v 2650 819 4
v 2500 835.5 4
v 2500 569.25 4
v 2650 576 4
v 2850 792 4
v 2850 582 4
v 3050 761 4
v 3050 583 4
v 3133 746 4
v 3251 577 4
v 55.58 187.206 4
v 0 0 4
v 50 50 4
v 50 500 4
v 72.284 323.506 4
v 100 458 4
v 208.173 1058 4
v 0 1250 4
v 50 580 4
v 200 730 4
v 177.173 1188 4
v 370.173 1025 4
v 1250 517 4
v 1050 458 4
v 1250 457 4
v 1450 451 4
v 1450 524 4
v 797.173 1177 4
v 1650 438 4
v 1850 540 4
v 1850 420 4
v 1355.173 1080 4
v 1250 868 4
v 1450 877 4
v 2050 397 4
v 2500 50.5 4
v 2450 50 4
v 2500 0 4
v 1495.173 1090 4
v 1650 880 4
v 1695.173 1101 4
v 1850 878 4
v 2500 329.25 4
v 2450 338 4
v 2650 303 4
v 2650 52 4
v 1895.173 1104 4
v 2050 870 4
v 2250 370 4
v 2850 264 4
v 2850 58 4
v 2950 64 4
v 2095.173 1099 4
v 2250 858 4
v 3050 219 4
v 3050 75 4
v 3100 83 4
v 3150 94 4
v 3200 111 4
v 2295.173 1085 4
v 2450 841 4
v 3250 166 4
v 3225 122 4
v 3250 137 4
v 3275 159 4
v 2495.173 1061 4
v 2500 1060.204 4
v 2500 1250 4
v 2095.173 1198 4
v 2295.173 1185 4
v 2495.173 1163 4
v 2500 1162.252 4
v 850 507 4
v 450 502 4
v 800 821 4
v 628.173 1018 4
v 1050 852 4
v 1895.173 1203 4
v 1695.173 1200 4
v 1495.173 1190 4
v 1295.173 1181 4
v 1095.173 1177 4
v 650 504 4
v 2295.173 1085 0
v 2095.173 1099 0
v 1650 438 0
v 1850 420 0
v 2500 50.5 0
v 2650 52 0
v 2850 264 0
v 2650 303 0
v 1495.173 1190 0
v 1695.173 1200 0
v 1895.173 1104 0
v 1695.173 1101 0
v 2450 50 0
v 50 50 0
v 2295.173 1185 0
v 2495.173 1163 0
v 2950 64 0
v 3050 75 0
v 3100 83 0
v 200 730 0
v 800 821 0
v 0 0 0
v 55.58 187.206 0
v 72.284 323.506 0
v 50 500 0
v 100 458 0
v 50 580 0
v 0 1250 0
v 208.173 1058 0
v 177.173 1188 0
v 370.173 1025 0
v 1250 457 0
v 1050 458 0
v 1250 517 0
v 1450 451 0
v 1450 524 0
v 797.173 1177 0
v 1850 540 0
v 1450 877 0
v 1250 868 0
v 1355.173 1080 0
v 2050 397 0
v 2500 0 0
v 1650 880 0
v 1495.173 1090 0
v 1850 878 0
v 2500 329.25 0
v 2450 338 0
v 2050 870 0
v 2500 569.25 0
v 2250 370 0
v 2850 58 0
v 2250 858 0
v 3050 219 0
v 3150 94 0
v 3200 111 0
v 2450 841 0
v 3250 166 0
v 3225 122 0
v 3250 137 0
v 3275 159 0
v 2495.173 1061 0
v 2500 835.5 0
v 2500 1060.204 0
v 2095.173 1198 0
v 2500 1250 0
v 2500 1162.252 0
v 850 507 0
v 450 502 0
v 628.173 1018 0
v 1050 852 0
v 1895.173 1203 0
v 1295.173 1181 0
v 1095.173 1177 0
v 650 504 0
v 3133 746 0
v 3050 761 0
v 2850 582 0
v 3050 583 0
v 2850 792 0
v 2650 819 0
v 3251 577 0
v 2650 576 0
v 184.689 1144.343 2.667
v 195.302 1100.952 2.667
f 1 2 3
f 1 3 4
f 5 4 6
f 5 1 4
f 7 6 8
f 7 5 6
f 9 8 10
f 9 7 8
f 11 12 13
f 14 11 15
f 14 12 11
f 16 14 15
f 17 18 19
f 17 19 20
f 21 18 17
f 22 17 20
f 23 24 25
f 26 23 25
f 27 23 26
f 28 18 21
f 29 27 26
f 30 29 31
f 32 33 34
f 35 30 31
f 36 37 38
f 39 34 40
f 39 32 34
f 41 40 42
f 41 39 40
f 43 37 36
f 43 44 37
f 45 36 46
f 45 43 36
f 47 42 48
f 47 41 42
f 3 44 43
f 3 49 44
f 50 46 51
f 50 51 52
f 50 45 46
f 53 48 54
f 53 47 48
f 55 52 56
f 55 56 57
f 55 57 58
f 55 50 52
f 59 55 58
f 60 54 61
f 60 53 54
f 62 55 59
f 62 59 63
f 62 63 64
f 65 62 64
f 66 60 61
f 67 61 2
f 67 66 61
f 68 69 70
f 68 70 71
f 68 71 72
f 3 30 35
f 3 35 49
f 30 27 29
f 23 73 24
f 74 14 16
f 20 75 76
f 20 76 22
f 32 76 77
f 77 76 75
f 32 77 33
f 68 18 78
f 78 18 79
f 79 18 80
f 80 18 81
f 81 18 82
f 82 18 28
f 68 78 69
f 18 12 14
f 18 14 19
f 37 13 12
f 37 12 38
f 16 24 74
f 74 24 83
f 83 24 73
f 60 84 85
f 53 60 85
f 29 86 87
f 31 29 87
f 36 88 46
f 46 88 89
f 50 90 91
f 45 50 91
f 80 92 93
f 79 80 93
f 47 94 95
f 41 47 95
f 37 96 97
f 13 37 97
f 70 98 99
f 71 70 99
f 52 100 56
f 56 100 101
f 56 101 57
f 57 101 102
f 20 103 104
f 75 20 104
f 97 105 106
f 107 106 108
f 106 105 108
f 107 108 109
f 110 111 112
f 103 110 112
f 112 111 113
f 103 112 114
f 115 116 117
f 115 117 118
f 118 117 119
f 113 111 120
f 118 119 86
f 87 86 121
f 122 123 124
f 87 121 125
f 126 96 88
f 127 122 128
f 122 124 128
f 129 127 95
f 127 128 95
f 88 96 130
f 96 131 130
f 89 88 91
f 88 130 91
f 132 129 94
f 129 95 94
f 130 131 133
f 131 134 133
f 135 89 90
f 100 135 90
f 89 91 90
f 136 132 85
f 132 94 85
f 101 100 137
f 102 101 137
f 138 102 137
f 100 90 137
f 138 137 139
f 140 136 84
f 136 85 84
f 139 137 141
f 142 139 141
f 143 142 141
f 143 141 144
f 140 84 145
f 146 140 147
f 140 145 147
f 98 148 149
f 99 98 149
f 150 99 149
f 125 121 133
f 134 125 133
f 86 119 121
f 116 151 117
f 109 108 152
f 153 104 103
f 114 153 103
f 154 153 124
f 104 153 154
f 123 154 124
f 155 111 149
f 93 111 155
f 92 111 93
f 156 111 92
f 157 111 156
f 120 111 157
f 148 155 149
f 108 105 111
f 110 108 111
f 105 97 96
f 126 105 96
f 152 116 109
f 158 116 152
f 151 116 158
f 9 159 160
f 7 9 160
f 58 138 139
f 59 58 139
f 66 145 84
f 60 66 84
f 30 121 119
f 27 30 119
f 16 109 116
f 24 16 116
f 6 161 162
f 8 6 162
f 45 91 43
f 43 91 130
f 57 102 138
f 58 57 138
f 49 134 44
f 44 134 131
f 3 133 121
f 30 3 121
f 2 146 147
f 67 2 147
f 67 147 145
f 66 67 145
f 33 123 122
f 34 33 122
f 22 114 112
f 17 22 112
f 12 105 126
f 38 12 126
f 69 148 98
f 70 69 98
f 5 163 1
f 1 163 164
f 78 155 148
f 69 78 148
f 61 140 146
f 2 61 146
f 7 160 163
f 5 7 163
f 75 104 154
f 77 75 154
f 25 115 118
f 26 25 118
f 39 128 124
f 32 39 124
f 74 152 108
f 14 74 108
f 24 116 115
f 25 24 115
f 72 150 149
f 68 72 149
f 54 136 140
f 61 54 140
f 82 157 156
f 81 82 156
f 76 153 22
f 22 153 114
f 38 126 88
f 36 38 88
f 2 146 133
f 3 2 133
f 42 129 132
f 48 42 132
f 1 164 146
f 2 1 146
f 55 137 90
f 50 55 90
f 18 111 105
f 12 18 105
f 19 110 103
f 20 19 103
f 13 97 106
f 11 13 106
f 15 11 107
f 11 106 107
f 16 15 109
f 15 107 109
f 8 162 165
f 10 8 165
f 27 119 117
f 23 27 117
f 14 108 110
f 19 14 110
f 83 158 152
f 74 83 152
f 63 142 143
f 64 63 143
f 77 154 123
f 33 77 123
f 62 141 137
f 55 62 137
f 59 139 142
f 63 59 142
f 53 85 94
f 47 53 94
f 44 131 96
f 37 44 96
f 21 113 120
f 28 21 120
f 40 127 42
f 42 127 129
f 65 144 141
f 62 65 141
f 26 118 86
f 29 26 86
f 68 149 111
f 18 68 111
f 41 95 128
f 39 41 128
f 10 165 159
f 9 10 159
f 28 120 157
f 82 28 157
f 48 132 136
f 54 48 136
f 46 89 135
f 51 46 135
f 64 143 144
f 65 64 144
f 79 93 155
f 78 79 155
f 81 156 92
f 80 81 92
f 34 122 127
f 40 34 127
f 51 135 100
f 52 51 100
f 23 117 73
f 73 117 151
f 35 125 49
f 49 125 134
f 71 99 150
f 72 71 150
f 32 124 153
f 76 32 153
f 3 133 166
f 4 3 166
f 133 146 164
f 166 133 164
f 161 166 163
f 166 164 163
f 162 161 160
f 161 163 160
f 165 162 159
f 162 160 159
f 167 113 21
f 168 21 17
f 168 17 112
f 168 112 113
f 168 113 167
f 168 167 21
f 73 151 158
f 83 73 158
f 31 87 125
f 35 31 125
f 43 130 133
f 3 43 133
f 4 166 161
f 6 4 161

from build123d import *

# Parameters (mm, degrees)
F1_DEPTH = 4


with BuildPart() as f1:
    # F0 (on Top) → F1 (new body)
    with BuildSketch(Plane.XY):
        Polygon((3250, 166), (3050, 219), (3050, 75), (3100, 83), (3150, 94), (3200, 111), (3225, 122), (3250, 137), (3275, 159), align=None)
        Polygon((2500, 329.25), (2500, 50.5), (2650, 52), (2650, 303), align=None)
        Polygon((2650, 303), (2650, 52), (2850, 58), (2850, 264), align=None)
        Polygon((2850, 264), (2850, 58), (2950, 64), (3050, 75), (3050, 219), align=None)
        Polygon((2450, 50), (2500, 50.5), (2500, 329.25), (2450, 338), align=None)
        with BuildLine():
            Line((0, 0), (2500, 0))
            Line((2500, 0), (2500, 50.5))
            Line((2500, 50.5), (2450, 50))
            Line((2450, 50), (2250, 50))
            Line((2250, 50), (2050, 50))
            Line((2050, 50), (1850, 50))
            Line((1850, 50), (1650, 50))
            Line((1650, 50), (1450, 50))
            Line((1450, 50), (1250, 50))
            Line((1250, 50), (1050, 50))
            Line((1050, 50), (50, 50))
            ThreePointArc((50, 50), (62.5465829239, 255.5261540534), (100, 458))
            Line((100, 458), (1050, 458))
            Line((1050, 458), (1250, 457))
            Line((1250, 457), (1450, 451))
            Line((1450, 451), (1650, 438))
            Line((1650, 438), (1850, 420))
            Line((1850, 420), (2050, 397))
            Line((2050, 397), (2250, 370))
            Line((2250, 370), (2450, 338))
            Line((2450, 338), (2500, 329.25))
            Line((2500, 329.25), (2500, 569.25))
            Line((2500, 569.25), (2450, 567))
            Line((2450, 567), (2250, 558))
            Line((2250, 558), (2050, 549))
            Line((2050, 549), (1850, 540))
            Line((1850, 540), (1650, 532))
            Line((1650, 532), (1450, 524))
            Line((1450, 524), (1250, 517))
            Line((1250, 517), (1050, 512))
            Line((1050, 512), (850, 507))
            Line((850, 507), (650, 504))
            Line((650, 504), (450, 502))
            Line((450, 502), (50, 500))
            Line((50, 500), (50, 580))
            Line((50, 580), (200, 730))
            Line((200, 730), (305.4945054945, 746))
            Line((305.4945054945, 746), (800, 821))
            Line((800, 821), (1050, 852))
            Line((1050, 852), (1250, 868))
            Line((1250, 868), (1450, 877))
            Line((1450, 877), (1650, 880))
            Line((1650, 880), (1850, 878))
            Line((1850, 878), (2050, 870))
            Line((2050, 870), (2250, 858))
            Line((2250, 858), (2450, 841))
            Line((2450, 841), (2500, 835.5))
            Line((2500, 835.5), (2500, 1060.2035867911))
            Line((2500, 1060.2035867911), (2495.1732532795, 1061))
            Line((2495.1732532795, 1061), (2295.1732532795, 1085))
            Line((2295.1732532795, 1085), (2095.1732532795, 1099))
            Line((2095.1732532795, 1099), (1895.1732532795, 1104))
            Line((1895.1732532795, 1104), (1695.1732532795, 1101))
            Line((1695.1732532795, 1101), (1495.1732532795, 1090))
            Line((1495.1732532795, 1090), (1355.1732532795, 1080))
            Line((1355.1732532795, 1080), (628.1732532795, 1018))
            Line((628.1732532795, 1018), (370.1732532795, 1025))
            Line((370.1732532795, 1025), (208.1732532795, 1058))
            add(Edge.make_bspline(
                [(177.1732532795, 1188), (182.8605817373, 1144.2682824135), (194.4515766318, 1100.6735346317), (208.1732532795, 1058)],
                knots=[0, 0, 0, 0, 133.645052284, 133.645052284, 133.645052284, 133.645052284], degree=3))
            Line((177.1732532795, 1188), (797.1732532795, 1177))
            Line((797.1732532795, 1177), (1095.1732532795, 1177))
            Line((1095.1732532795, 1177), (1295.1732532795, 1181))
            Line((1295.1732532795, 1181), (1495.1732532795, 1190))
            Line((1495.1732532795, 1190), (1695.1732532795, 1200))
            Line((1695.1732532795, 1200), (1895.1732532795, 1203))
            Line((1895.1732532795, 1203), (2095.1732532795, 1198))
            Line((2095.1732532795, 1198), (2295.1732532795, 1185))
            Line((2295.1732532795, 1185), (2495.1732532795, 1163))
            Line((2495.1732532795, 1163), (2500, 1162.2518542583))
            Line((2500, 1162.2518542583), (2500, 1250))
            Line((2500, 1250), (0, 1250))
            Line((0, 1250), (0, 0))
        make_face()
    extrude(amount=F1_DEPTH)


with BuildPart() as f1b:
    # F0 (on Top) → F1, piece 2 (new body)
    with BuildSketch(Plane.XY):
        Polygon((2500, 835.5), (2500, 569.25), (2650, 576), (2850, 582), (3050, 583), (3251, 577), (3133, 746), (3050, 761), (2850, 792), (2650, 819), align=None)
    extrude(amount=F1_DEPTH)


solid = Compound([f1.part, f1b.part])
